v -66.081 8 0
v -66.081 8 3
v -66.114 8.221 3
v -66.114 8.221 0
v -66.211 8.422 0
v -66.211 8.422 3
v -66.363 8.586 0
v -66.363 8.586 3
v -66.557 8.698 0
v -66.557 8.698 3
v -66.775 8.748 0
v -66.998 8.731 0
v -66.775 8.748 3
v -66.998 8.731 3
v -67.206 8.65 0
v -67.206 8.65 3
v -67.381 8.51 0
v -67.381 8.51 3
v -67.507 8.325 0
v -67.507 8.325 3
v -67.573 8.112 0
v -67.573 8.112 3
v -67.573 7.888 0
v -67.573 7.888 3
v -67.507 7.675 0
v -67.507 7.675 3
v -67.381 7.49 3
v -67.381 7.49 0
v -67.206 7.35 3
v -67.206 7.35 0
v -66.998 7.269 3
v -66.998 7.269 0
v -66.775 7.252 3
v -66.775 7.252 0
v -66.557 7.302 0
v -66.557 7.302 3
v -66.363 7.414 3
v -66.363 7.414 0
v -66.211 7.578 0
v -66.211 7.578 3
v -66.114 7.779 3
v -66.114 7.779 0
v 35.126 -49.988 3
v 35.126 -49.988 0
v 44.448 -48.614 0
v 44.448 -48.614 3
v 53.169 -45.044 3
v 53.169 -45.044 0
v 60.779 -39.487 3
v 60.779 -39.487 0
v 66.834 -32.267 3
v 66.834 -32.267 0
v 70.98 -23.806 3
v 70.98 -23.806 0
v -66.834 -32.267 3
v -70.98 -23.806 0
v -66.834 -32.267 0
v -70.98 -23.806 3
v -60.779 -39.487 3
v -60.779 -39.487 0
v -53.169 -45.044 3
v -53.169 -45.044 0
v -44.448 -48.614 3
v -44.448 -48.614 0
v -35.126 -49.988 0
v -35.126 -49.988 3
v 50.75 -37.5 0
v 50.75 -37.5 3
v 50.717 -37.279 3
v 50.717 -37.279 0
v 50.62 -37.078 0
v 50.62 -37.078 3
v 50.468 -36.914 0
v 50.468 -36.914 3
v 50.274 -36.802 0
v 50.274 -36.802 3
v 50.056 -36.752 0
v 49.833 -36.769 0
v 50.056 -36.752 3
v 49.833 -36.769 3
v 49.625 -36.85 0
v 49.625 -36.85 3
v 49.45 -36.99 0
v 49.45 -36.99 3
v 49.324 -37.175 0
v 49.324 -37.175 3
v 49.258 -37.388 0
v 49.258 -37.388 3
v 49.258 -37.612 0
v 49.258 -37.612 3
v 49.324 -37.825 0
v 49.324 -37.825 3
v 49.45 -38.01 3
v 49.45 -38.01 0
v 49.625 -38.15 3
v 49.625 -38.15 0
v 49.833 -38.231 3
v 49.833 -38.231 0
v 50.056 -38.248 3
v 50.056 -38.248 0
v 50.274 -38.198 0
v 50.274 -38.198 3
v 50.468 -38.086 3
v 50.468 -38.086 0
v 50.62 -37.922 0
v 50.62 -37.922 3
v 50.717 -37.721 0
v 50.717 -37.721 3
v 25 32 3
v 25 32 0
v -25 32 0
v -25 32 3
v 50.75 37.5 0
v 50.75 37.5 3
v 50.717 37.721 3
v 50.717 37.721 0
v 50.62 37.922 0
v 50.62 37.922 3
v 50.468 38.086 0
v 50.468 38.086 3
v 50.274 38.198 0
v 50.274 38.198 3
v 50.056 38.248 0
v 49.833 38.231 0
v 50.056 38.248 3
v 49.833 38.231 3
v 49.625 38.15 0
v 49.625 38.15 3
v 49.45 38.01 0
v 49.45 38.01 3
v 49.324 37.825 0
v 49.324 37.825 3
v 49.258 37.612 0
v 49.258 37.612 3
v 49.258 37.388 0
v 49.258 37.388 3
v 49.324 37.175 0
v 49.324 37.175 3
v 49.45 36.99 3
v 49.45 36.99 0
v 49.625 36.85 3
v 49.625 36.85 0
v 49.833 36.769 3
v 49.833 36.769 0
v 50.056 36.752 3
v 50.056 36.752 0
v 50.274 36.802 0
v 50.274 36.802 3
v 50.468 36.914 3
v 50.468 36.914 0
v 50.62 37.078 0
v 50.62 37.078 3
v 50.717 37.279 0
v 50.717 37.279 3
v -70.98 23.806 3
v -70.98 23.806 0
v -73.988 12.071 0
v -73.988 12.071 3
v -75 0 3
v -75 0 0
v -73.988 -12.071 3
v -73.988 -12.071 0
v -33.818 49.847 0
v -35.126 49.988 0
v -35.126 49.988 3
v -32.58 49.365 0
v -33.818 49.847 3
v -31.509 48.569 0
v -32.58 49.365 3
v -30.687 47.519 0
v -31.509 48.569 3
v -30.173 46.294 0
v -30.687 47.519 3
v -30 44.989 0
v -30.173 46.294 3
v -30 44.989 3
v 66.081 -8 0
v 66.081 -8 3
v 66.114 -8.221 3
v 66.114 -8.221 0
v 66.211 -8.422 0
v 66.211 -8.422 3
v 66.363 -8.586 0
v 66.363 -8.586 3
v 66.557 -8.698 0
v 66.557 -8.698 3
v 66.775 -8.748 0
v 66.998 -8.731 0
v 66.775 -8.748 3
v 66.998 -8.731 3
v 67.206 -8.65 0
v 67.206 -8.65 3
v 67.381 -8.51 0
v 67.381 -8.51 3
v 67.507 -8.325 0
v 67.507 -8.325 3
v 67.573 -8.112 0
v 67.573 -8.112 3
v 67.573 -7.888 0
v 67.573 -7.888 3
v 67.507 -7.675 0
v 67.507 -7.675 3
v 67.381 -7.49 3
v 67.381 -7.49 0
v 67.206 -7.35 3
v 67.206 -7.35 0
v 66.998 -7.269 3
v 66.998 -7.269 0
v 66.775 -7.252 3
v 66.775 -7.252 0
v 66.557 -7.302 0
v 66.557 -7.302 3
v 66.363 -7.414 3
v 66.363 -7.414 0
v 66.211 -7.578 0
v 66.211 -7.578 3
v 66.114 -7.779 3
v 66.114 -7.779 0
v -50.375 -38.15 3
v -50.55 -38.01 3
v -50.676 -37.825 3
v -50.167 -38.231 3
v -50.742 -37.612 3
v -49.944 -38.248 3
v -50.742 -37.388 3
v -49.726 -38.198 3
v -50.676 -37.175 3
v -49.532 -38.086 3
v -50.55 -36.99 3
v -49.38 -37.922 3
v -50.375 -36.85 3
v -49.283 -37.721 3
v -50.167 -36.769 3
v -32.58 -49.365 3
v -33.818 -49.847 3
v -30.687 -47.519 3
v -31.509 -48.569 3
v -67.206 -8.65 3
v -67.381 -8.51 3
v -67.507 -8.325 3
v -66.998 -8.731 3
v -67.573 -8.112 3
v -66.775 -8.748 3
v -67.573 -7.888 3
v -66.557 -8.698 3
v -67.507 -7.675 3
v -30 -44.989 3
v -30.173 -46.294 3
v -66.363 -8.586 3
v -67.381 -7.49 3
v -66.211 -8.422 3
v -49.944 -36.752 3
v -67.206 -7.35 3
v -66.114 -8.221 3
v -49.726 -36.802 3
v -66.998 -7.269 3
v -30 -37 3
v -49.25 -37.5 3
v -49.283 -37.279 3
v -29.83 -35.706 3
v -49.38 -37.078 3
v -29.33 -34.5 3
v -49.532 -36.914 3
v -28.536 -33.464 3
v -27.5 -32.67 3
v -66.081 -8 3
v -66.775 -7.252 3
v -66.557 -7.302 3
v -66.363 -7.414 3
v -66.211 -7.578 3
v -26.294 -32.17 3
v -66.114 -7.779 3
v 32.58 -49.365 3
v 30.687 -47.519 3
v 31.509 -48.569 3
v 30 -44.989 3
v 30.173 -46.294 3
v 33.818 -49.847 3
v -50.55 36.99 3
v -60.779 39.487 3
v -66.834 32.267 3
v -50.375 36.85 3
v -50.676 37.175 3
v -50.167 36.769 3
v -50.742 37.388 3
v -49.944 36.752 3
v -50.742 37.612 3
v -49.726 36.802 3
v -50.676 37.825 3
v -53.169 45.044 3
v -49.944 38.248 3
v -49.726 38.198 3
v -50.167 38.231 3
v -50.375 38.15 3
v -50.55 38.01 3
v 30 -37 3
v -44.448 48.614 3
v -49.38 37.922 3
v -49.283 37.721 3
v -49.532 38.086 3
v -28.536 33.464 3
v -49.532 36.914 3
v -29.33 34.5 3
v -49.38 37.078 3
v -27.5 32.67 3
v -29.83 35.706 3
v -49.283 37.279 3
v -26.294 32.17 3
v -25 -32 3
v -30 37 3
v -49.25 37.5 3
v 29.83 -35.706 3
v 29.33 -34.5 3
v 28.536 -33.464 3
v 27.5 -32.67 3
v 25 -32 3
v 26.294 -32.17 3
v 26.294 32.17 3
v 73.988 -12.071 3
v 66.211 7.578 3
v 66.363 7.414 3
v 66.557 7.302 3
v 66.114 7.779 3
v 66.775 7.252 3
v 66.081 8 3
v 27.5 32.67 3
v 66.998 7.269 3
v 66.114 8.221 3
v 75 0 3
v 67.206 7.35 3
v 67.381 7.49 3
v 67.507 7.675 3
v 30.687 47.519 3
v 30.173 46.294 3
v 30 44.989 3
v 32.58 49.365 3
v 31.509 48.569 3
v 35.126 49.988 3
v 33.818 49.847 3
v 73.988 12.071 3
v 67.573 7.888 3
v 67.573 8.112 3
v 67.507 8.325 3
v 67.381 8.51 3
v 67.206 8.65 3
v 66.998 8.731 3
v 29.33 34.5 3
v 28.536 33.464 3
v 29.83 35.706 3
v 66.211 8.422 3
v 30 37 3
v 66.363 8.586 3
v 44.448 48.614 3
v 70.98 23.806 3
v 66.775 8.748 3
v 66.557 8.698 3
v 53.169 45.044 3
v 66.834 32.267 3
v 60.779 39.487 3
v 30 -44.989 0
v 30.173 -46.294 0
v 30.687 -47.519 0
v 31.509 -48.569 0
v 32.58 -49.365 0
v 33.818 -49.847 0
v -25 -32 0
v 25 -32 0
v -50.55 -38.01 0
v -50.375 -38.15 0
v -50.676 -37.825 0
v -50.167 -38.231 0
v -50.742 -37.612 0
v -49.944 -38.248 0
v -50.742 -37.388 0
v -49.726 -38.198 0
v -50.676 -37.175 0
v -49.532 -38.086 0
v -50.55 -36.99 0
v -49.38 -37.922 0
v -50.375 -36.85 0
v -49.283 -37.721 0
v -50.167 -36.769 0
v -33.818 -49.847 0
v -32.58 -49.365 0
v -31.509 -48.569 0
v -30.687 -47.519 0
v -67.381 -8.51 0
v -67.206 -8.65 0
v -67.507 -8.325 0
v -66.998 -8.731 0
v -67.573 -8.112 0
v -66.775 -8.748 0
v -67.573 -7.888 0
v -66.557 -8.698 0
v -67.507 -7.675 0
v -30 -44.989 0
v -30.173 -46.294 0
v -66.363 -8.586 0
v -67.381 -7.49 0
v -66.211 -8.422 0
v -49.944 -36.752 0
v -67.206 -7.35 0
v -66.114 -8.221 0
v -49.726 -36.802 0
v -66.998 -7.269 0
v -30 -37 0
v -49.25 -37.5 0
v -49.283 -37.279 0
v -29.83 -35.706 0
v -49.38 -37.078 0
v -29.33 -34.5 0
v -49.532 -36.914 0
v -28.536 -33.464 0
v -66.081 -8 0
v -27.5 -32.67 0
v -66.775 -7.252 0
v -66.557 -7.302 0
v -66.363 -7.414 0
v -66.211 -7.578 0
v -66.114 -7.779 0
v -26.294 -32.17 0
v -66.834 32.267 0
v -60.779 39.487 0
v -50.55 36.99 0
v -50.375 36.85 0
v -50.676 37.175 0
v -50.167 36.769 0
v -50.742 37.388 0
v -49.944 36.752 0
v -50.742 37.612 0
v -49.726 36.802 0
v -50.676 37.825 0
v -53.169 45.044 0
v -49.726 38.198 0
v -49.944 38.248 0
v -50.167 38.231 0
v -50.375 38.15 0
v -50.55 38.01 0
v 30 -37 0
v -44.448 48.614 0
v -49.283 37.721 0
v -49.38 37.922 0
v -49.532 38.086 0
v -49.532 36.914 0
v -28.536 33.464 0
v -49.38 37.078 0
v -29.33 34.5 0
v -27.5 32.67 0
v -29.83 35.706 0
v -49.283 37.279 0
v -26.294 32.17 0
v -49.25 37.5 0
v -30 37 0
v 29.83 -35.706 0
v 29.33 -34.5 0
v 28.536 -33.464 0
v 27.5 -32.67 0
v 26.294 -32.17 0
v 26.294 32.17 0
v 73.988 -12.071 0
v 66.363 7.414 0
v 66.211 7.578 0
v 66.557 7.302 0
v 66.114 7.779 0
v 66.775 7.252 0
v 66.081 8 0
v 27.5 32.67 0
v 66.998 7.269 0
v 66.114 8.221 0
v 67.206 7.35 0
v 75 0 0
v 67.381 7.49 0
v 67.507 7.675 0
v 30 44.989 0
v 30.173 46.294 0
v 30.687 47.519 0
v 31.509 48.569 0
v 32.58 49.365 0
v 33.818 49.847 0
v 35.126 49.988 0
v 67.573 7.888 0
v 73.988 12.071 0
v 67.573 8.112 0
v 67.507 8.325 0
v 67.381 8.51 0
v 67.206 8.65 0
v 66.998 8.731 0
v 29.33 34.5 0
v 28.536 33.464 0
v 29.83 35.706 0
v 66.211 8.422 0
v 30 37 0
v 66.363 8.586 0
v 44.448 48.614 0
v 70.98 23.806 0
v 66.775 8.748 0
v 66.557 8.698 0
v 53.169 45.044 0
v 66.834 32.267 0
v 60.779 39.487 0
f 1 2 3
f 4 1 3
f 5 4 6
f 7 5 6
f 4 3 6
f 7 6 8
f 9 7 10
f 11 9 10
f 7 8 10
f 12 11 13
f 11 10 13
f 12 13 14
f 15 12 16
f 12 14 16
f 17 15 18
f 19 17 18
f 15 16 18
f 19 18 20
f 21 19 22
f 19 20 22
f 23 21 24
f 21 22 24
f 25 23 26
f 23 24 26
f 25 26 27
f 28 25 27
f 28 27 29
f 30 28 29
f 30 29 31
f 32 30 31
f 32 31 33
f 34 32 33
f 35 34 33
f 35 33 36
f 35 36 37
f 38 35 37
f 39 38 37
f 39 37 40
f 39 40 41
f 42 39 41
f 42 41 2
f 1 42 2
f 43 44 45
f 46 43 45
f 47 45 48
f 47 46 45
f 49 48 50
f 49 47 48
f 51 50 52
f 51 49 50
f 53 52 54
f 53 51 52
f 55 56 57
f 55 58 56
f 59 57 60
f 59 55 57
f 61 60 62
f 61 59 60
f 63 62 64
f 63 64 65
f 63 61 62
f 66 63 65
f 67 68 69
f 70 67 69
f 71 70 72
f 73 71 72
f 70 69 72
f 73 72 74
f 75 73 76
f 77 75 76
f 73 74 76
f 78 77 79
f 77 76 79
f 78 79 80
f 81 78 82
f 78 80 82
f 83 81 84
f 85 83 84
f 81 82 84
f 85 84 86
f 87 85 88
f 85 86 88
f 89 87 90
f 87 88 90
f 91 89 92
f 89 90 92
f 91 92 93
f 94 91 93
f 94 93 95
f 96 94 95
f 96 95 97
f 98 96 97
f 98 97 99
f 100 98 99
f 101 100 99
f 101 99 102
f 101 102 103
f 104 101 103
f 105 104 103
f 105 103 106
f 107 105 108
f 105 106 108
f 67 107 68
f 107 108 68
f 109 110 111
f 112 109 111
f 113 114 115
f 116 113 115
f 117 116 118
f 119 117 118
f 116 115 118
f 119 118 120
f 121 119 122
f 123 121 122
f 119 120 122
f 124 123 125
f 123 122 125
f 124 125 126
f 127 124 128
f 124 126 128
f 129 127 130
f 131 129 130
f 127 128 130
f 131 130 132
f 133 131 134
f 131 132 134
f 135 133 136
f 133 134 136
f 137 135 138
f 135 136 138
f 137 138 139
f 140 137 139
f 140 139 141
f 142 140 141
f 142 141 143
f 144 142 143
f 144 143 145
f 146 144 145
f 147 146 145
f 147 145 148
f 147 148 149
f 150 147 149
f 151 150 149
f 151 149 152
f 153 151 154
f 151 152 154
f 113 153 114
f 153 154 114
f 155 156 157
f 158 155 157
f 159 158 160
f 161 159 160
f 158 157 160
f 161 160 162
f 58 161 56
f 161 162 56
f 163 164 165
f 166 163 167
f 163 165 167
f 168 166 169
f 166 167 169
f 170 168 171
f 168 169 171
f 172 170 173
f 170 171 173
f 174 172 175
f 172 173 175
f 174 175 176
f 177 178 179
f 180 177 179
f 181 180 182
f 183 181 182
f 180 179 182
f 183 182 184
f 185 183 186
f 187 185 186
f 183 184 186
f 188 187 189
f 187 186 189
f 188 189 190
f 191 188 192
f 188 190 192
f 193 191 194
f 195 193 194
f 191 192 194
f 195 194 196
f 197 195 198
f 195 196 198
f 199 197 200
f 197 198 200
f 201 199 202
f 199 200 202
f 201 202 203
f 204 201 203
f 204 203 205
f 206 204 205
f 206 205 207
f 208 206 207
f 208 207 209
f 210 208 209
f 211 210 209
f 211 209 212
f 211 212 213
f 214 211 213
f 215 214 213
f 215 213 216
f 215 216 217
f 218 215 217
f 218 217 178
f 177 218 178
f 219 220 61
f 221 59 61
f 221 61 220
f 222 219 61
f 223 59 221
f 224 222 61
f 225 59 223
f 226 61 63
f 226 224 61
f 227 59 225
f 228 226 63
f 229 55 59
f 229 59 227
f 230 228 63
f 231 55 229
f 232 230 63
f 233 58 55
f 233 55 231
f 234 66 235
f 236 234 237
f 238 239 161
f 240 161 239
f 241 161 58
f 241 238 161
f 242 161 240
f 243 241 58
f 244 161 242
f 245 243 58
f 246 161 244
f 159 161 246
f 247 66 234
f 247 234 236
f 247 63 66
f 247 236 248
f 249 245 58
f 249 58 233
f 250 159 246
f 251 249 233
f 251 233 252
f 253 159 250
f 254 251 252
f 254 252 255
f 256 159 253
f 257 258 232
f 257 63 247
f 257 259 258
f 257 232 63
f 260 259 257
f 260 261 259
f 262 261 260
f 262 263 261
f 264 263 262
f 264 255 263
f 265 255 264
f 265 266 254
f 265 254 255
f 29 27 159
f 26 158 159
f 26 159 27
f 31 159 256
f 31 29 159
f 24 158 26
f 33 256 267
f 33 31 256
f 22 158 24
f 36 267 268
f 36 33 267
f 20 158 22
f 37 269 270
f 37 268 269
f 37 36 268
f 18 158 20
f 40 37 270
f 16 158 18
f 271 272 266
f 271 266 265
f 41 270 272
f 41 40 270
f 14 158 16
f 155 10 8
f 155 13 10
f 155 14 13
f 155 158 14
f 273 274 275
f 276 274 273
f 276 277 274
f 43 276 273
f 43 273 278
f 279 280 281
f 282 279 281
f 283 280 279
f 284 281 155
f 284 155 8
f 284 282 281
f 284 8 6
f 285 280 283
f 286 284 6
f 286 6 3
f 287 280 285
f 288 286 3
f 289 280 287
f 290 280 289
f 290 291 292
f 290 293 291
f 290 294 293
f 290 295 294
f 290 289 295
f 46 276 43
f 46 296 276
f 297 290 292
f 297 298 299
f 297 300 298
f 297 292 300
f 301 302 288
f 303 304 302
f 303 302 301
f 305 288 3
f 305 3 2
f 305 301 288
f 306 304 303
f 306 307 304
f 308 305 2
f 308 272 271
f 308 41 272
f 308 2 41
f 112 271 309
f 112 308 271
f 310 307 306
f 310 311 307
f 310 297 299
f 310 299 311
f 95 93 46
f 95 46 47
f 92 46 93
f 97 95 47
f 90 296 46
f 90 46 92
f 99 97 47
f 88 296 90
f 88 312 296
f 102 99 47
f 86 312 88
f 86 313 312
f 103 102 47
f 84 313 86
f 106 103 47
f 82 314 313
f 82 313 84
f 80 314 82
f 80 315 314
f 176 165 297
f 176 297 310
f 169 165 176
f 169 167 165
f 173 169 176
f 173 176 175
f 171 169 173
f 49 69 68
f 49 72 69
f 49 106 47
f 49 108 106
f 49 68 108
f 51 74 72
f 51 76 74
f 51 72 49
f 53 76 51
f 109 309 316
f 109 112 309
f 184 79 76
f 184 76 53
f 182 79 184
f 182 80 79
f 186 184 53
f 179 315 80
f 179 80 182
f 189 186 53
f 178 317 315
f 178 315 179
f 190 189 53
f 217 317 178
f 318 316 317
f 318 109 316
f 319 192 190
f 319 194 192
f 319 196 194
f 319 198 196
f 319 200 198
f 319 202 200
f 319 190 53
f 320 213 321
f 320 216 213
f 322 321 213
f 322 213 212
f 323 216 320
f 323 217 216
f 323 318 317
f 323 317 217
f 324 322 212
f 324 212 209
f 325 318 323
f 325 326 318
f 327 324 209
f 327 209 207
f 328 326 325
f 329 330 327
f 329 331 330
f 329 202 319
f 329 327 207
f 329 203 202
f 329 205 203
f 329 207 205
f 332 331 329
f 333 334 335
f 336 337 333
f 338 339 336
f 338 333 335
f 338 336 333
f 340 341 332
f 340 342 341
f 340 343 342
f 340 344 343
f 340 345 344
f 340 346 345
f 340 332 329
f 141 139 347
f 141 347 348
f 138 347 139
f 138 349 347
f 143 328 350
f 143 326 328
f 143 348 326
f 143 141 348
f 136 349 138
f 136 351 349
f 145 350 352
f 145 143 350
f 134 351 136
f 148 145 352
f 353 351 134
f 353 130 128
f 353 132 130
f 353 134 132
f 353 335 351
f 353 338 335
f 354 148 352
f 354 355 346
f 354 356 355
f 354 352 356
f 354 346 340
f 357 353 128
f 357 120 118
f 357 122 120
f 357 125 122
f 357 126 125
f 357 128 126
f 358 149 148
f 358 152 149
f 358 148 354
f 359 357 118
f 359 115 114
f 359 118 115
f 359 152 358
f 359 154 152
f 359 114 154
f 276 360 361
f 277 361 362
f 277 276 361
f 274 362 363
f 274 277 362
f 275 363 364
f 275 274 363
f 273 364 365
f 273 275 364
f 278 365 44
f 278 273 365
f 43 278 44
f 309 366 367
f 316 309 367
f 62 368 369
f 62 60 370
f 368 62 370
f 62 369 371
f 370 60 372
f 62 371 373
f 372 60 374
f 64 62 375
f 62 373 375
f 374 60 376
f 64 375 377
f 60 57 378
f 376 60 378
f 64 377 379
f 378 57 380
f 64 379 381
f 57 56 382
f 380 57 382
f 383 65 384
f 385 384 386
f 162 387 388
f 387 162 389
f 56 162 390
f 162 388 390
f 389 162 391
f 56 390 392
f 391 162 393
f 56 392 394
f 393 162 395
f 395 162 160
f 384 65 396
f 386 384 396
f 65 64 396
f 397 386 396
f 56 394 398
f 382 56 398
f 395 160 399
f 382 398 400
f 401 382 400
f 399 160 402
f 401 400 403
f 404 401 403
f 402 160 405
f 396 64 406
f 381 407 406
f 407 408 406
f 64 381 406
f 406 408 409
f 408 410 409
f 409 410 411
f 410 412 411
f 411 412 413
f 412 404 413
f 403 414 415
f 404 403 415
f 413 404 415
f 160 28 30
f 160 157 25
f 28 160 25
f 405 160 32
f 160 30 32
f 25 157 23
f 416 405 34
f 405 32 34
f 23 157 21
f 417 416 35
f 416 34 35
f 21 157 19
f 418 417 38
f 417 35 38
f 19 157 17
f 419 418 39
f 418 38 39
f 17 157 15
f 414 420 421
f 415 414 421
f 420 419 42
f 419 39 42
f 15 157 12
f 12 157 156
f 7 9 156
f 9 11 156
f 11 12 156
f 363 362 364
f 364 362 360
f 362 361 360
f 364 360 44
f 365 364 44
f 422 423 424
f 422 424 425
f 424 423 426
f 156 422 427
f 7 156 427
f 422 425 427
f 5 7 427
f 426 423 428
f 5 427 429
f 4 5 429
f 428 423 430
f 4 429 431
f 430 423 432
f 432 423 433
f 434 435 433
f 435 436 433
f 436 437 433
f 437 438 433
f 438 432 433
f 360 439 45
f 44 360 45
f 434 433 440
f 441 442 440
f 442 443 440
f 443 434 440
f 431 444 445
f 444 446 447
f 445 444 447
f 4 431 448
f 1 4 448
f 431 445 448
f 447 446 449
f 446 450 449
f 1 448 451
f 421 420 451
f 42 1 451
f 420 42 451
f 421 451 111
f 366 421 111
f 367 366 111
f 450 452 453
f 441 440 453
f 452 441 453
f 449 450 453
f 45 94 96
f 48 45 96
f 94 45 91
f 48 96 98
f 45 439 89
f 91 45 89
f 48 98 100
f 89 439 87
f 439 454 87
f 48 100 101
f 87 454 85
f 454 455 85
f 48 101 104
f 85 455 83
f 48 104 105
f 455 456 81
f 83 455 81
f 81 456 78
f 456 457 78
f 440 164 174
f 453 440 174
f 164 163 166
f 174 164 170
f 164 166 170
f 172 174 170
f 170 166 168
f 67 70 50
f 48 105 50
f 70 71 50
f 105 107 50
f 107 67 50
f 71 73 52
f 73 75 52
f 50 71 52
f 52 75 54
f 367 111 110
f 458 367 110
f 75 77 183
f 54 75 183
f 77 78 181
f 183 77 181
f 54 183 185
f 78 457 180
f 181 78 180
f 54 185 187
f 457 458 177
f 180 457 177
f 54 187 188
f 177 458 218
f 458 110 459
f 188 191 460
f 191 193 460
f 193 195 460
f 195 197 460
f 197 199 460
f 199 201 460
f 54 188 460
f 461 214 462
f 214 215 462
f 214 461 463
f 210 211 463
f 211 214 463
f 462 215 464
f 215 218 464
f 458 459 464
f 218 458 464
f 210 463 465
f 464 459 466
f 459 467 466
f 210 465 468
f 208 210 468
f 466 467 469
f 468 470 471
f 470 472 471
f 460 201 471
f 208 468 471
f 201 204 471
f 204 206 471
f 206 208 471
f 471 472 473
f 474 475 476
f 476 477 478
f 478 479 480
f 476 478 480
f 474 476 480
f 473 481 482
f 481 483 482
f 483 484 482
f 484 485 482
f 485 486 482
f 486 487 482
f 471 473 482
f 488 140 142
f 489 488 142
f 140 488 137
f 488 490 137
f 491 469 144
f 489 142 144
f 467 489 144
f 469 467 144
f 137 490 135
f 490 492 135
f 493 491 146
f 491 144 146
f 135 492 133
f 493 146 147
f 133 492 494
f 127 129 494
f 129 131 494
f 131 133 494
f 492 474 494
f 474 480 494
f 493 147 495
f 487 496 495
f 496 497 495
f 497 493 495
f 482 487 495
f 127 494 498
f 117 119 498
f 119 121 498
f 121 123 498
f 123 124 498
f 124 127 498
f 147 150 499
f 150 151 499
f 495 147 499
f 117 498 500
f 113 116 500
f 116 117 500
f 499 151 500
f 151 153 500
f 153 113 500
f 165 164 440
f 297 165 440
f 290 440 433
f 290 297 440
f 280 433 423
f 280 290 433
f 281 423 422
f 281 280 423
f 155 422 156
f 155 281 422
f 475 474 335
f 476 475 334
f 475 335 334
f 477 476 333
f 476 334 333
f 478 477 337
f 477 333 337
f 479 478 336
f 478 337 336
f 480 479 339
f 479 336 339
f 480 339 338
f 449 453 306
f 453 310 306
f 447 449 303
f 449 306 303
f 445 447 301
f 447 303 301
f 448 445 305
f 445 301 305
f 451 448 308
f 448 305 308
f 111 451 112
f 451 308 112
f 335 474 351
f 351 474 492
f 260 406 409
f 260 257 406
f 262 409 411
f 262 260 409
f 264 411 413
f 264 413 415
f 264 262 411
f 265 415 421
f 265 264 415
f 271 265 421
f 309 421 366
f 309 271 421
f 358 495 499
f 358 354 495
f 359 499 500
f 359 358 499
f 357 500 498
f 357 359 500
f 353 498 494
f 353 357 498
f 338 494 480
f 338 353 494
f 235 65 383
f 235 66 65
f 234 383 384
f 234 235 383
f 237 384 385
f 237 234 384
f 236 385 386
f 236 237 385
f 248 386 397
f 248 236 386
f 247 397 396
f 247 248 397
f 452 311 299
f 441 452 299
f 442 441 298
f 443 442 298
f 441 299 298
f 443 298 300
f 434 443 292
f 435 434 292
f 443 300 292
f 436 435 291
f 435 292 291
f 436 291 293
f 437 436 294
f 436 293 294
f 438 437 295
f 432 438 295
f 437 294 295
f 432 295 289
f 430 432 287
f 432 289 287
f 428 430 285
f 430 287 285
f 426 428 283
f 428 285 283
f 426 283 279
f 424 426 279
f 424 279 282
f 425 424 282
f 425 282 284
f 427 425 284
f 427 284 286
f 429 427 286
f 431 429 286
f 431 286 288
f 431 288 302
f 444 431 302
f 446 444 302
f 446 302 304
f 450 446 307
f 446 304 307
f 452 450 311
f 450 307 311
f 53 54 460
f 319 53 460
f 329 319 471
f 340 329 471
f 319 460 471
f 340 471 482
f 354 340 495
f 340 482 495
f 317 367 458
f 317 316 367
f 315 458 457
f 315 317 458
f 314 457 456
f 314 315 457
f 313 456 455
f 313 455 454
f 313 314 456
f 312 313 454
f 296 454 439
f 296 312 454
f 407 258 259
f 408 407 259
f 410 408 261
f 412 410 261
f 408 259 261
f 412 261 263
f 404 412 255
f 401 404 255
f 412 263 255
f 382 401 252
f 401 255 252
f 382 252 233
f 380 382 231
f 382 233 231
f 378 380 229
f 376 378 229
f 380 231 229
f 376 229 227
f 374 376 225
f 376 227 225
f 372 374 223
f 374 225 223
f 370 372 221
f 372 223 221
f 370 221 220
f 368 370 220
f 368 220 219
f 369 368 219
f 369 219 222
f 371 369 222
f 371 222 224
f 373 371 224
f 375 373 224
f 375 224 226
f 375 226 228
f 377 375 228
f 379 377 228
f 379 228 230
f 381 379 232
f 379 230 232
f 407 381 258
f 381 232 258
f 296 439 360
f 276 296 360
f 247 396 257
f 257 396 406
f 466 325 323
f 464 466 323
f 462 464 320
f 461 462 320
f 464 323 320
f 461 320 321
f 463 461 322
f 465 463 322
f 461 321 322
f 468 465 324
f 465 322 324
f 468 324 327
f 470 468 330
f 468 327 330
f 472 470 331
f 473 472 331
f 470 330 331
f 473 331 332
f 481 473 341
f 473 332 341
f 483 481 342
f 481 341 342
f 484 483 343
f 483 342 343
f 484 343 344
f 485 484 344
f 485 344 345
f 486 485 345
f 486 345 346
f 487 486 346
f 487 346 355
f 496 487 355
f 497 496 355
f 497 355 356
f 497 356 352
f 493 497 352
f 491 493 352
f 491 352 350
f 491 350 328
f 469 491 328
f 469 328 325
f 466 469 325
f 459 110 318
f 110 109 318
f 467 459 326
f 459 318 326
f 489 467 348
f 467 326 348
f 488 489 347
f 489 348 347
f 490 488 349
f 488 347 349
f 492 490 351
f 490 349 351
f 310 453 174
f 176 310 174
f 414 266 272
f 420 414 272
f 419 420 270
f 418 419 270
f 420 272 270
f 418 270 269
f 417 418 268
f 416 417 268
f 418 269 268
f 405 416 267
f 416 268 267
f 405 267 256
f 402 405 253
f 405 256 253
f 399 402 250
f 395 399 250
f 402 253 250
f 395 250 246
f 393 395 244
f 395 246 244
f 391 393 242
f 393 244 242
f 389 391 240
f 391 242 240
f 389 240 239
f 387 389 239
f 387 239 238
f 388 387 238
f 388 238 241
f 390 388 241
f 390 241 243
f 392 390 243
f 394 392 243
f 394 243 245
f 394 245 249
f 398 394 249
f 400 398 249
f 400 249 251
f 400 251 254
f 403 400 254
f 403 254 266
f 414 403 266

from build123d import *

# Parameters (mm, degrees)
BOSS_EXTRUDE1_DEPTH = 3
FILLET1_R           = 39
FILLET3_R           = 5
SKETCH7_R           = 0.75
CUT_EXTRUDE2_DEPTH  = 3
SKETCH8_R           = 0.75
CUT_EXTRUDE3_DEPTH  = 91.182696374


with BuildPart() as part:
    # Sketch1 → Boss-Extrude1 (new body)
    with BuildSketch(Plane.XY):
        Polygon((-30, 50), (-55, 50), (-55, -50), (-30, -50), (-30, -32), (30, -32), (30, -50), (55, -50), (55, 50), (30, 50), (30, 32), (-30, 32), align=None)
        with BuildLine():
            Line((-55, -50), (-55, 50))
            ThreePointArc((-55, 50), (-75, 0), (-55, -50))
        make_face()
        with BuildLine():
            ThreePointArc((55, -50), (75, 0), (55, 50))
            Line((55, 50), (55, -50))
        make_face()
    extrude(amount=BOSS_EXTRUDE1_DEPTH)

    # Fillet1
    fillet1_edges = [part.edges().sort_by_distance(p)[0] for p in [
        (-55, 50, 1.5),
        (55, 50, 1.5),
        (55, -50, 1.5),
        (-55, -50, 1.5),
    ]]
    fillet(fillet1_edges, radius=FILLET1_R)

    # Fillet3
    fillet3_edges = [part.edges().sort_by_distance(p)[0] for p in [
        (30, -50, 1.5),
        (-30, -50, 1.5),
        (30, 50, 1.5),
        (-30, 50, 1.5),
        (30, 32, 1.5),
        (-30, 32, 1.5),
        (-30, -32, 1.5),
        (30, -32, 1.5),
    ]]
    fillet(fillet3_edges, radius=FILLET3_R)

    # Sketch7 → Cut-Extrude2 (cut)
    with BuildSketch(Plane.XY.offset(3)):
        with Locations((-50, 37.5)):
            Circle(SKETCH7_R)
        with Locations((-50, -37.5)):
            Circle(SKETCH7_R)
        with Locations((50, -37.5)):
            Circle(SKETCH7_R)
        with Locations((50, 37.5)):
            Circle(SKETCH7_R)
    extrude(amount=-CUT_EXTRUDE2_DEPTH, mode=Mode.SUBTRACT)

    # Sketch8 → Cut-Extrude3 (cut, through all)
    with BuildSketch(Plane.XY.offset(3)):
        with Locations((-66.83099976, 8)):
            Circle(SKETCH8_R)
        with Locations((-66.83099976, -8)):
            Circle(SKETCH8_R)
        with Locations(Location((66.83099976, -8, 0), (0, 0, 180))):
            Circle(SKETCH8_R)
        with Locations(Location((66.83099976, 8, 0), (0, 0, 180))):
            Circle(SKETCH8_R)
    extrude(amount=-CUT_EXTRUDE3_DEPTH, mode=Mode.SUBTRACT)


solid = part.part
